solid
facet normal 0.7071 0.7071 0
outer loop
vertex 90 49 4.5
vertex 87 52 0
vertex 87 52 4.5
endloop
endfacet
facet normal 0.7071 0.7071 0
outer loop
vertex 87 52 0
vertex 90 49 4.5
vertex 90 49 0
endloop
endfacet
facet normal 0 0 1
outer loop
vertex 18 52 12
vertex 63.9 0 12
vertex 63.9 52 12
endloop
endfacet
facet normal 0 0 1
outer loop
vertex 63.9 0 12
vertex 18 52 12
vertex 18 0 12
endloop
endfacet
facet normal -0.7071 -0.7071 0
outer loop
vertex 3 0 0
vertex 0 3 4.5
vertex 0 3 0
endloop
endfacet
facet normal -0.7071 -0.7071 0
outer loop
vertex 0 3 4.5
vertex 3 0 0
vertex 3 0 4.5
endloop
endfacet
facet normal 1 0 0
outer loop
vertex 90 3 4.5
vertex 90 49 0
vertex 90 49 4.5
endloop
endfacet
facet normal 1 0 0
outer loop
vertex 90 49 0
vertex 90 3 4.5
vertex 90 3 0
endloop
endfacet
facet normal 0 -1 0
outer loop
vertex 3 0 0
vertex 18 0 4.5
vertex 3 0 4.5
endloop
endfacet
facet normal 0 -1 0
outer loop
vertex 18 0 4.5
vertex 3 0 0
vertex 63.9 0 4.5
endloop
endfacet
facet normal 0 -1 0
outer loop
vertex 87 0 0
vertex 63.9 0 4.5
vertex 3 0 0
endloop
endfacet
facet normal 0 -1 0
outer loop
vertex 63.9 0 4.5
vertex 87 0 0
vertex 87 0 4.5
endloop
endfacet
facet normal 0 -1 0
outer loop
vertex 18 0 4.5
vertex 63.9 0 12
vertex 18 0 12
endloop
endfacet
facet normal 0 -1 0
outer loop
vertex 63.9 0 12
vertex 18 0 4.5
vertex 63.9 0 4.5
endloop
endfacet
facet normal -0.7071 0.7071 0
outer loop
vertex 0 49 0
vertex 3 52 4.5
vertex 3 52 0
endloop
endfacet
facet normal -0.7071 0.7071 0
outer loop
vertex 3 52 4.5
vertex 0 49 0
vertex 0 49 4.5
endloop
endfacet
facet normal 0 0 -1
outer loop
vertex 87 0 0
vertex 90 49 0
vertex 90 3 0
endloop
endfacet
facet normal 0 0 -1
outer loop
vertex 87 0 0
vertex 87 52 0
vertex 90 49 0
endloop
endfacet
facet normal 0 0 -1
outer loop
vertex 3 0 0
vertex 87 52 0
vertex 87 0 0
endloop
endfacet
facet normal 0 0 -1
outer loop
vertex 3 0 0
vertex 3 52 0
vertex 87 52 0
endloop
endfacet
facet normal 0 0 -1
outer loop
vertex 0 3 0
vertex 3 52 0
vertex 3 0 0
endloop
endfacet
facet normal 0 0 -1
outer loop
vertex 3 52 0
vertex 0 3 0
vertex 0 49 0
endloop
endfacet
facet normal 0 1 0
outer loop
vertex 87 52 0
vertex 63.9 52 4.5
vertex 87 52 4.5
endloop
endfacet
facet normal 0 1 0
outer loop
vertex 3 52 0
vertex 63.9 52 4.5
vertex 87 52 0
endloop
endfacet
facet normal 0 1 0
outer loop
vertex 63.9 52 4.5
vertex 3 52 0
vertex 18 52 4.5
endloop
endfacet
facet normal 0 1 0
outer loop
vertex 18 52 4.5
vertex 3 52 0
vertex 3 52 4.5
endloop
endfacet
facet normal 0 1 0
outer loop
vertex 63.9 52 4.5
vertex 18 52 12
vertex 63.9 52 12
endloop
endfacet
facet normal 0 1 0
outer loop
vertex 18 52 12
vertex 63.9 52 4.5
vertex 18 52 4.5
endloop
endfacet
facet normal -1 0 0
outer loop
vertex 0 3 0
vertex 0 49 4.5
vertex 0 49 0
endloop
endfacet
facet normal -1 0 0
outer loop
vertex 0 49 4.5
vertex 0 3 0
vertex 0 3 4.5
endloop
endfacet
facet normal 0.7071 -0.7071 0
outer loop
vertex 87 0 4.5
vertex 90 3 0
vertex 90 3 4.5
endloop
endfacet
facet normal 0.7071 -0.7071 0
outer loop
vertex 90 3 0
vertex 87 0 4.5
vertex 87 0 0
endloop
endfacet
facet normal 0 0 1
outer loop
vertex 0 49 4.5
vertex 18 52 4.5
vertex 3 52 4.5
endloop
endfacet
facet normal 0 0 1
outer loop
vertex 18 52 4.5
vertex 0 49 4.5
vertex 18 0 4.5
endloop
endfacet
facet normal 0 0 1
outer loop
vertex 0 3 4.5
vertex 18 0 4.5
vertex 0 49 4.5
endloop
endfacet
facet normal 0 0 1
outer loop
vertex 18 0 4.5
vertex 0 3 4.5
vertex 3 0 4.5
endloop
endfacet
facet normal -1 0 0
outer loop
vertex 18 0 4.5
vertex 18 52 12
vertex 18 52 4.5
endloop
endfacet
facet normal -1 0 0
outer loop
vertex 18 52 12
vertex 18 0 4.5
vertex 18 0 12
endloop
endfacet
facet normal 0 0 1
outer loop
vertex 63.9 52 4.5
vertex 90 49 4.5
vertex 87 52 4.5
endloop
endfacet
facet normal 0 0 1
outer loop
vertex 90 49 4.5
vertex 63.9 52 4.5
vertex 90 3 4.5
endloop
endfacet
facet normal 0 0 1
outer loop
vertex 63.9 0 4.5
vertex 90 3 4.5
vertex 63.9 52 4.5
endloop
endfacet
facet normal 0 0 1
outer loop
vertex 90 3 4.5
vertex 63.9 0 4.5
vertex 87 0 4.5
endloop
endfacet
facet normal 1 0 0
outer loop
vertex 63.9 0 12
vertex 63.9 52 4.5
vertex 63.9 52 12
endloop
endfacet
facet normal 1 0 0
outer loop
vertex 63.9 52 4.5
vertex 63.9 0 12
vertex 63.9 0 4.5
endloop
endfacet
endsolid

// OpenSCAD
$fn = 32;

// ----------------------------------------------------------------------
// Stepped bar: centerstep, 90 x 52 x 12/4.5 mm
// ----------------------------------------------------------------------

// --- parameters (mm) ---
bar_l = 90;               // bar length, X
bar_w = 52;               // bar width, Y
plate_t = 12;             // thickness of the thick zone, Z
thin_t = 4.5;             // thickness of the thin zone
corner_c = 3;             // corner chamfer of the bar
step_cut = 7.5;           // material removed from the thin zone
thick_from = 18;          // start of the thick middle zone
thick_to = 63.9;          // end of the thick middle zone
depth_1 = 7.5;            // depth of cut 1 from the top face
depth_2 = 7.5;            // depth of cut 2 from the top face

profile = [[3, 0], [87, 0], [90, 3], [90, 49], [87, 52], [3, 52], [0, 49], [0, 3]];  // primary outline, 8 points, counter clockwise
void_1 = [[-1, -1], [18, -1], [18, 53], [-1, 53]];  // thin left end, 4 points
void_2 = [[63.9, -1], [91, -1], [91, 53], [63.9, 53]];  // thin right end, 4 points

// --- the one profile operation ---
difference() {
  linear_extrude(height = plate_t) polygon(points = profile);
  translate([0, 0, plate_t - depth_1])
    linear_extrude(height = depth_1 + 1) polygon(points = void_1);
  translate([0, 0, plate_t - depth_2])
    linear_extrude(height = depth_2 + 1) polygon(points = void_2);
}
